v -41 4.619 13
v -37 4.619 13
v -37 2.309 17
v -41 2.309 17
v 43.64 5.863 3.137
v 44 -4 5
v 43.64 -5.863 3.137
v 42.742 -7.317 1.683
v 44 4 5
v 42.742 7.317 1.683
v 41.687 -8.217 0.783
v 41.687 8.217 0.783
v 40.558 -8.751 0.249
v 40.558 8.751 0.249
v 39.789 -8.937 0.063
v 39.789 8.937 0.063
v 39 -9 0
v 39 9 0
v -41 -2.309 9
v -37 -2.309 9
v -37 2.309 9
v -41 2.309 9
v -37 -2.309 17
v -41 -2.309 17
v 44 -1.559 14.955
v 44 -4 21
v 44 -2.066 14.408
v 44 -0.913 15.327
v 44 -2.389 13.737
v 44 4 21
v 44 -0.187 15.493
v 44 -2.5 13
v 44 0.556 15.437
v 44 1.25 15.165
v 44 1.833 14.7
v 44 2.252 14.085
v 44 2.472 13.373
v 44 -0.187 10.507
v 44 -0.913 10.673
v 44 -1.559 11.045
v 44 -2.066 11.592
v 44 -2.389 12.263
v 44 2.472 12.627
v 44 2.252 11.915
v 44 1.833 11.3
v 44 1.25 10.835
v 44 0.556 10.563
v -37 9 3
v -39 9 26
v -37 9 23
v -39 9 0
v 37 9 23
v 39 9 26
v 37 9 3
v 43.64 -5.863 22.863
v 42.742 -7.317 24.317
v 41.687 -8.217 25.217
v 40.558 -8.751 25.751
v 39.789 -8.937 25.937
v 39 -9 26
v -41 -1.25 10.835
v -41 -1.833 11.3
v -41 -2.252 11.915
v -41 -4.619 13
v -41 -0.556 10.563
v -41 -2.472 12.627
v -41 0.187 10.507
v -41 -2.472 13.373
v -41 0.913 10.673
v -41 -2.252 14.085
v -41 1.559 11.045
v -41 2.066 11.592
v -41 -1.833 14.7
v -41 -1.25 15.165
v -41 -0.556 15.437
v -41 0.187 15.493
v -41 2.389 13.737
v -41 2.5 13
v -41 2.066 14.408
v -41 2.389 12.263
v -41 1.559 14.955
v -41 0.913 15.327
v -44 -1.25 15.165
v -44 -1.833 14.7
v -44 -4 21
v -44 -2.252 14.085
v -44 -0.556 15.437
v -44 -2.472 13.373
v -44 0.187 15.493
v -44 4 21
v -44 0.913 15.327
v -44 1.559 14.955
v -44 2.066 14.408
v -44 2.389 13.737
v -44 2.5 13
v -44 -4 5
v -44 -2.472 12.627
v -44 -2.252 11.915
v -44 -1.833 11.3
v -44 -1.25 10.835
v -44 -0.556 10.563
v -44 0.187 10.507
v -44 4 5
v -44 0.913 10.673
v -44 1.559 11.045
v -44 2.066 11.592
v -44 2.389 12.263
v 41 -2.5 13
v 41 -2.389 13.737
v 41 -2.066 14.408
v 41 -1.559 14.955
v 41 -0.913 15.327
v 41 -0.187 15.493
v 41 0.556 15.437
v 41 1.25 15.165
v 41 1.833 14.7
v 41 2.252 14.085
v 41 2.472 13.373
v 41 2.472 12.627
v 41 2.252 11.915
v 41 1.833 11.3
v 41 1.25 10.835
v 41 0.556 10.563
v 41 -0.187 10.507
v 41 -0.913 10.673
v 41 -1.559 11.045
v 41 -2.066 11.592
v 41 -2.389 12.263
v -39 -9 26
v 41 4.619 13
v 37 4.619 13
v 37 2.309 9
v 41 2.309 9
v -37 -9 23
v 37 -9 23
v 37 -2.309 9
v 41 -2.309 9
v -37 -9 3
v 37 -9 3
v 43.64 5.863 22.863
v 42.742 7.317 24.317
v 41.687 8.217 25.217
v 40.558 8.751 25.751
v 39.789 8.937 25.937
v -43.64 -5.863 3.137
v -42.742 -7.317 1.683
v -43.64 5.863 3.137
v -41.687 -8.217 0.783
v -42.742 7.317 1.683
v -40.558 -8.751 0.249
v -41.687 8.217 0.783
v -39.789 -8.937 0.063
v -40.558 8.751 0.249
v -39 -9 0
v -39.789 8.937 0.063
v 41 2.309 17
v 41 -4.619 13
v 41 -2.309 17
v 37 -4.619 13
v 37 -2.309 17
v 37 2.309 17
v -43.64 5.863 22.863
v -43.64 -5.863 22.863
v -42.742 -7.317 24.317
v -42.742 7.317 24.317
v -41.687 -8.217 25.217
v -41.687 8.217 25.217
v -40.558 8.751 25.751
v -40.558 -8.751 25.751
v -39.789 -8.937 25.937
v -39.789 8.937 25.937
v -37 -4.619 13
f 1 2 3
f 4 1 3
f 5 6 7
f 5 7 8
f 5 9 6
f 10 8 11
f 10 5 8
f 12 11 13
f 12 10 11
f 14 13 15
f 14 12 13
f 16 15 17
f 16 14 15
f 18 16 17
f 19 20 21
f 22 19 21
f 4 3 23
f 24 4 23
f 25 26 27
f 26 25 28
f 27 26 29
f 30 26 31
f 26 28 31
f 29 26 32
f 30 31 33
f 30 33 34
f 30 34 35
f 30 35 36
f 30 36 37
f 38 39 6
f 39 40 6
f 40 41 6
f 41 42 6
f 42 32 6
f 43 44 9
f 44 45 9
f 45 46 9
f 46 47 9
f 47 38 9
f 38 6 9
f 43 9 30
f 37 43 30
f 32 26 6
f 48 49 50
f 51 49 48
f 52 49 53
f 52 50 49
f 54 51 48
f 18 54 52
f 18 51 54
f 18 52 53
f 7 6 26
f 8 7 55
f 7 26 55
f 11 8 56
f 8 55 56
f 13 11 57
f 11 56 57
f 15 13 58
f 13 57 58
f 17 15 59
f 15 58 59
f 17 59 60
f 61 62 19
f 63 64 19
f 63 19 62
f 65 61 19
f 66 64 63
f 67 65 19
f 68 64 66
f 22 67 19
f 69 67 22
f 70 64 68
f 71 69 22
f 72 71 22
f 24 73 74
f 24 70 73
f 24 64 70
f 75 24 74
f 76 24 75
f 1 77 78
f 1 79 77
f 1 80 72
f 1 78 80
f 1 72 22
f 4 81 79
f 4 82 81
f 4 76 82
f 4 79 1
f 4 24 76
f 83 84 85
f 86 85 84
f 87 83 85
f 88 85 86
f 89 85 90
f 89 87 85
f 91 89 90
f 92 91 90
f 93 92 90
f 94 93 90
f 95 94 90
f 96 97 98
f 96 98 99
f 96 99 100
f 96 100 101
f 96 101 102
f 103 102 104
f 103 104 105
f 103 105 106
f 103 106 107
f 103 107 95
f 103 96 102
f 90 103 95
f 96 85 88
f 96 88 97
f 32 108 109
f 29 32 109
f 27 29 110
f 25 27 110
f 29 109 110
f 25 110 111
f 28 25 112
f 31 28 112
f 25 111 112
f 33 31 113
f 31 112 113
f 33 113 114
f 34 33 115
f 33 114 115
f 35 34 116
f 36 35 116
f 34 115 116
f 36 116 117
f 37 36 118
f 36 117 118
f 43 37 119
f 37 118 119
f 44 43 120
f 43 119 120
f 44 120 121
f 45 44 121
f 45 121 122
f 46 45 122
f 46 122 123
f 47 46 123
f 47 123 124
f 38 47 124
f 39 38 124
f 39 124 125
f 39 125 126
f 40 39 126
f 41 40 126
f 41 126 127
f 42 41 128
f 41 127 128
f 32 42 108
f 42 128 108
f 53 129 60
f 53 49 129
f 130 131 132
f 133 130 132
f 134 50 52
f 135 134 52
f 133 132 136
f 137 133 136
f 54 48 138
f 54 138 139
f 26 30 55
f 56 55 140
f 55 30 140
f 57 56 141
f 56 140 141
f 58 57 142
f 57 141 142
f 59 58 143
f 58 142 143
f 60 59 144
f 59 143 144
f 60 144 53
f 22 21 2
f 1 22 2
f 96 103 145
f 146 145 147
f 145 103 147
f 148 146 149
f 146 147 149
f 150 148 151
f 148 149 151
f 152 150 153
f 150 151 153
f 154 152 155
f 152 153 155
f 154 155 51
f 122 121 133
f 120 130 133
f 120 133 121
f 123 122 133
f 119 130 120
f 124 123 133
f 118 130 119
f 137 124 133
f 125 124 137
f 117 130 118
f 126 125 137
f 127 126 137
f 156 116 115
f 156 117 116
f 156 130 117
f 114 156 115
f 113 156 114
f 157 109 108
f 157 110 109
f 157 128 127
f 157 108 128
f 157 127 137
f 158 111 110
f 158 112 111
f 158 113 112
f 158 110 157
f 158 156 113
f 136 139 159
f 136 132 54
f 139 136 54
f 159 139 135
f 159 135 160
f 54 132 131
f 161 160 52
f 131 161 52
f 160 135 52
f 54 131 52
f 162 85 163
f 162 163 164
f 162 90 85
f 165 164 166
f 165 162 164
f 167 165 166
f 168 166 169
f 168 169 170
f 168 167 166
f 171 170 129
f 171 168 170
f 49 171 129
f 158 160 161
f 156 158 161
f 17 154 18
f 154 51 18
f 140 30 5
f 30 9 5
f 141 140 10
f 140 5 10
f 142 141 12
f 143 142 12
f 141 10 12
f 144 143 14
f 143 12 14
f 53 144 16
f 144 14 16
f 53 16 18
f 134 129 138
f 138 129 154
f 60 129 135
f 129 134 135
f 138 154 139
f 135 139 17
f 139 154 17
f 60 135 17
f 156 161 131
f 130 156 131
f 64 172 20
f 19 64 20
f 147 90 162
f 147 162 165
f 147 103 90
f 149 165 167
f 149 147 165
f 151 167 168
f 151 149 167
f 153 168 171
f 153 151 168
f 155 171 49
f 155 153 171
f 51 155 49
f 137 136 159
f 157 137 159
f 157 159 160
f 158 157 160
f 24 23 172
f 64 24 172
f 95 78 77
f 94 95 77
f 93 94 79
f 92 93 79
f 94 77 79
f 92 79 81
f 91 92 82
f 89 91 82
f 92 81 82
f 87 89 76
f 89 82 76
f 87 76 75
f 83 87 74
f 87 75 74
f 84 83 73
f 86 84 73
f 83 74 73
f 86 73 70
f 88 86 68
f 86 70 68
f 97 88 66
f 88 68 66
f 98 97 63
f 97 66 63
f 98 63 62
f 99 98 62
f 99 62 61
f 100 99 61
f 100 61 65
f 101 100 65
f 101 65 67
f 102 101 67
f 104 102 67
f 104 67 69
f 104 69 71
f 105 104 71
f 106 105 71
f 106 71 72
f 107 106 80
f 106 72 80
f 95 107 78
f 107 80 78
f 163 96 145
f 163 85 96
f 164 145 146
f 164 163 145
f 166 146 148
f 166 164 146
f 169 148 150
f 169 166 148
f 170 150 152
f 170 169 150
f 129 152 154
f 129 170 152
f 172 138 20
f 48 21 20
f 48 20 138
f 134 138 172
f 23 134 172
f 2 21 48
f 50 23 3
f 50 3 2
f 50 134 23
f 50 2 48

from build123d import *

# Parameters (mm, degrees)
F0_W      = 88
F0_H      = 18
F1_DEPTH  = 23
F2_W      = 74
F2_H      = 18
F3_DEPTH  = 20
F5_DEPTH  = 4
F7_DEPTH  = 4
F8_R      = 2.5
F9_DEPTH  = 3
F10_R     = 2.5
F11_DEPTH = 3
F12_W     = 88
F12_H     = 18
F13_DEPTH = 3
F15_R     = 5


with BuildPart() as f1:
    # F0 (on Top) → F1 (new body)
    with BuildSketch(Plane.XY):
        Rectangle(F0_W, F0_H)
    extrude(amount=F1_DEPTH)

    # F2 (on face) → F3 (cut)
    with BuildSketch(Plane.XY.offset(23)):
        Rectangle(F2_W, F2_H)
    extrude(amount=-F3_DEPTH, mode=Mode.SUBTRACT)

    # F4 (on face) → F5 (cut)
    with BuildSketch(Plane(origin=(37, 0, 0), x_dir=(0, -1, 0), z_dir=(-1, 0, 0))):
        Polygon((-2.309401, 9), (2.309401, 9), (4.618802, 13), (2.309401, 17), (-2.309401, 17), (-4.618802, 13), align=None)
    extrude(amount=-F5_DEPTH, mode=Mode.SUBTRACT)

    # F6 (on face) → F7 (cut)
    with BuildSketch(Plane.YZ.offset(-37)):
        Polygon((-2.309401, 9), (2.309401, 9), (4.618802, 13), (2.309401, 17), (-2.309401, 17), (-4.618802, 13), align=None)
    extrude(amount=-F7_DEPTH, mode=Mode.SUBTRACT)

    # F8 (on face) → F9 (cut, through all)
    with BuildSketch(Plane(origin=(41, 0, 0), x_dir=(0, -1, 0), z_dir=(-1, 0, 0))):
        with Locations((0, 13)):
            Circle(F8_R)
    extrude(amount=-F9_DEPTH, mode=Mode.SUBTRACT)

    # F10 (on face) → F11 (cut, through all)
    with BuildSketch(Plane.YZ.offset(-41)):
        with Locations((0, 13)):
            Circle(F10_R)
    extrude(amount=-F11_DEPTH, mode=Mode.SUBTRACT)


with BuildPart() as f13:
    # F12 (on face) → F13 (new body)
    with BuildSketch(Plane.XY.offset(23)):
        Rectangle(F12_W, F12_H)
    extrude(amount=F13_DEPTH)


with BuildPart() as f1_1:
    add(f1.part)

    # F14: union F13
    add(f13.part)

    # F15
    f15_edges = [f1_1.edges().sort_by_distance(p)[0] for p in [
        (-44, 0, 26),
        (-44, 0, 0),
        (44, 0, 26),
        (44, 0, 0),
        (-44, -9, 13),
        (-44, 9, 13),
        (44, -9, 13),
        (44, 9, 13),
    ]]
    fillet(f15_edges, radius=F15_R)


solid = f1_1.part
